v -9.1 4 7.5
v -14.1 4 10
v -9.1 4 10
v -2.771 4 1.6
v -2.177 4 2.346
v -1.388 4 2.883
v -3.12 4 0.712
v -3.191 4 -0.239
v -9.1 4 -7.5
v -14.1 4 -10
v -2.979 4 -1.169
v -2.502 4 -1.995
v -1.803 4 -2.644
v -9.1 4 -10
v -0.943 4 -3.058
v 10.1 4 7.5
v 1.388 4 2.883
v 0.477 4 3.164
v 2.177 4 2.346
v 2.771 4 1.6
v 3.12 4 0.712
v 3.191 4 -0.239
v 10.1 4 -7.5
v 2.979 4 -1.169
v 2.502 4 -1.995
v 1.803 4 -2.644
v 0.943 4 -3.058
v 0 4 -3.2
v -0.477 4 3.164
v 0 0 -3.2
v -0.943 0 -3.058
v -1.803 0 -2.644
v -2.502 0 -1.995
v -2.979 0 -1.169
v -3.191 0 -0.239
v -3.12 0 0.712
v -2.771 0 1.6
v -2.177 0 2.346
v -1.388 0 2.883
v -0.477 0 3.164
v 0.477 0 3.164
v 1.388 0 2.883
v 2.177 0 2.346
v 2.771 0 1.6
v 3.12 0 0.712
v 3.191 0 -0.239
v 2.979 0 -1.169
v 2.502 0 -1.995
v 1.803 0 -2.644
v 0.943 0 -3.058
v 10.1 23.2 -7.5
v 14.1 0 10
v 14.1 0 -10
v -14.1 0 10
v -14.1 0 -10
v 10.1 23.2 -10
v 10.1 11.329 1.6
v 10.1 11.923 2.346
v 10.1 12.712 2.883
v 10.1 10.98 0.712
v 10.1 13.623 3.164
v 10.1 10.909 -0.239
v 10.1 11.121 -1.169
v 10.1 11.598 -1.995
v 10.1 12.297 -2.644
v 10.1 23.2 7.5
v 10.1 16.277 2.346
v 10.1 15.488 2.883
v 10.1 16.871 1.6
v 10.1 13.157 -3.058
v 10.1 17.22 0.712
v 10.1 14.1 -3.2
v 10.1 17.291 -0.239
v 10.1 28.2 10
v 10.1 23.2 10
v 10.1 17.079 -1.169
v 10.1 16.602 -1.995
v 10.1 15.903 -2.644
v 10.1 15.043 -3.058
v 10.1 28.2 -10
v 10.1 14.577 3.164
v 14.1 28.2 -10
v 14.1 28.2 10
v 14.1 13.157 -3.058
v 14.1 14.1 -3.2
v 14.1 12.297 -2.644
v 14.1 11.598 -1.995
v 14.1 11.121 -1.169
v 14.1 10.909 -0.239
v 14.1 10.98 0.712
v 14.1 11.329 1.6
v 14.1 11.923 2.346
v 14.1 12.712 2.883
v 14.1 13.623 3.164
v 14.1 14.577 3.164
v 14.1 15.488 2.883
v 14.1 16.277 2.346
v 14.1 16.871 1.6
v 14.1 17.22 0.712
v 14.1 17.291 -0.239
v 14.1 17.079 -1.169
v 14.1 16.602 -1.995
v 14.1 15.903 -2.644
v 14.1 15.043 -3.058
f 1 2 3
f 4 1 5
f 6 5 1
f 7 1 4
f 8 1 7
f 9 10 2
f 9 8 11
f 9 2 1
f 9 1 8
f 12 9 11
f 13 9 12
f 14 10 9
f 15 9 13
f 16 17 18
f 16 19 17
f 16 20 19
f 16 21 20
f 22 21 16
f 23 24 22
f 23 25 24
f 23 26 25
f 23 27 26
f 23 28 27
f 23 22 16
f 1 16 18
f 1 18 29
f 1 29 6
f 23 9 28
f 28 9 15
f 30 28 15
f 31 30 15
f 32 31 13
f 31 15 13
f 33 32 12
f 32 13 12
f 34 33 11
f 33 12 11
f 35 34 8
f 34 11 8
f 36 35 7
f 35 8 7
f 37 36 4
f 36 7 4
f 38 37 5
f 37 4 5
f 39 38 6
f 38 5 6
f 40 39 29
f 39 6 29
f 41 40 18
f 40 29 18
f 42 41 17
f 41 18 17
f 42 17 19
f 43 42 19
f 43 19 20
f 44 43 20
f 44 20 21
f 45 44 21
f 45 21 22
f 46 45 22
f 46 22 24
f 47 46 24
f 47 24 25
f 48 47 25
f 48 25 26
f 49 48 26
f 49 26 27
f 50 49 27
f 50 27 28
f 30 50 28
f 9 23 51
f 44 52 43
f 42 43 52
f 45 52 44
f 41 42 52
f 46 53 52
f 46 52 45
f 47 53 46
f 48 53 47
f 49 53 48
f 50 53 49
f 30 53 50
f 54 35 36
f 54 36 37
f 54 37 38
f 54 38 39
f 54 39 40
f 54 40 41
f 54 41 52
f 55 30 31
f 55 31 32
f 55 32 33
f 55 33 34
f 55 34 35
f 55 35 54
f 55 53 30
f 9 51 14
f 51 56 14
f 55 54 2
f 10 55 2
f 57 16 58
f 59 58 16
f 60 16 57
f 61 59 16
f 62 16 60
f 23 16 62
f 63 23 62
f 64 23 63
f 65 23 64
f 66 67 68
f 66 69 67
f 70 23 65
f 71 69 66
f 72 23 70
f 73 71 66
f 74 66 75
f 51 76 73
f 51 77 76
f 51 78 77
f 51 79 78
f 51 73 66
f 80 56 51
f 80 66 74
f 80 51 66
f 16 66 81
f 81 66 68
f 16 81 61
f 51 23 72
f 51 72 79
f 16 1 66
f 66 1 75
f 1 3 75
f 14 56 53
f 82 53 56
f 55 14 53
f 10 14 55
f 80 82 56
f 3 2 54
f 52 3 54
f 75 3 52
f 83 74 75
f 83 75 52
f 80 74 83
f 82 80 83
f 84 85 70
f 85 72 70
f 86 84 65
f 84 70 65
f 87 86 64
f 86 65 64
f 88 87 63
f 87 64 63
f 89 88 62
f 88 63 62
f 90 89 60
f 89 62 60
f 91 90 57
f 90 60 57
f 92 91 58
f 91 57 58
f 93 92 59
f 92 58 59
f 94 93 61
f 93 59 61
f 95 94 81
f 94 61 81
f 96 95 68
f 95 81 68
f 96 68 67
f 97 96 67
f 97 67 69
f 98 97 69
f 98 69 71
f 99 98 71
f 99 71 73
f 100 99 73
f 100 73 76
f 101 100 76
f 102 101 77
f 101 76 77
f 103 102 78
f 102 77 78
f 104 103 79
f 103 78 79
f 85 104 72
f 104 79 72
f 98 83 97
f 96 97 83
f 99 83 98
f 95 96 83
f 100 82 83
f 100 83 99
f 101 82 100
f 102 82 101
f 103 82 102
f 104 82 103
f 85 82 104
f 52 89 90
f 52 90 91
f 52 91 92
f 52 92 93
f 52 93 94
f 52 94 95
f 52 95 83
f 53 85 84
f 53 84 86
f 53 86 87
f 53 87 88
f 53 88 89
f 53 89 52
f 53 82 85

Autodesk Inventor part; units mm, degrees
ref_plane "YZ Plane" through (0, 0, 0) normal (1, 0, 0) x (0, 1, 0)
ref_plane "XZ Plane" through (0, 0, 0) normal (0, 1, 0) x (-1, 0, 0)
ref_plane "XY Plane" through (0, 0, 0) normal (0, 0, 1) x (1, 0, 0)
sketch "Sketch1" plane through (0, 0, 0) normal (0, 0, 1) x (1, 0, 0)
  line L0 (14.1, 28.2) -> (14.1, 0)
  line L1 (14.1, 0) -> (-14.1, 0)
  line L2 (-14.1, 0) -> (-14.1, 4)
  line L3 (-14.1, 4) -> (10.1, 4)
  line L4 (10.1, 4) -> (10.1, 28.2)
  line L5 (10.1, 28.2) -> (14.1, 28.2)
  point P0 (0, 0)
  point P1 (0, 0)
  dimension "d0" = 28.2
  dimension "d1" = 4
extrude "Escuadra cuerpo" add sketch "Sketch1" along normal mid plane 20
sketch "Sketch2" plane through (0, 0, 10) normal (0, 0, 1) x (1, 0, 0)
  line L0 (10.1, 4) -> (-14.1, 4) projected
  line L1 (-9.1, 4) -> (10.1, 23.2)
  line L2 (10.1, 23.2) -> (10.1, 4)
  line L3 (10.1, 4) -> (-9.1, 4)
  line L4 (14.1, 28.2) -> (10.1, 28.2) projected
  point P0 (0, 0)
  dimension "d4" = 5
  dimension "d5" = 5
extrude "Nervia lateral 1" add sketch "Sketch2" against normal blind 2.5
sketch "Sketch3" plane through (0, 0, -10) normal (0, 0, -1) x (-1, 0, 0)
  line L0 (-10.1, 4) -> (-10.1, 23.2) projected
  line L1 (-10.1, 23.2) -> (9.1, 4)
  line L2 (14.1, 4) -> (-10.1, 4) projected
  line L3 (-10.1, 4) -> (-10.1, 28.2) projected
  line L4 (-10.1, 23.2) -> (-10.1, 4)
  line L5 (-10.1, 4) -> (9.1, 4)
  point P0 (0, 0)
  dimension "d8" = 5
  dimension "d9" = 5
extrude "Nervio lateral 2" add sketch "Sketch3" against normal blind 2.5
sketch "Sketch4" plane through (-14.1, 0, 10) normal (0, -1, 0) x (1, 0, 0)
  point P0 (14.1, -10)
  point P1 (14.1, -10)
hole "BCC M6 1" at (0, 0, 0) direction (0, 1, 0) diameter 6.4 end through all
sketch "Sketch5" plane through (14.1, 0, 10) normal (1, 0, 0) x (0, 0, -1)
  line L0 (0, 0) -> (0, 28.2) projected
  line L1 (20, 0) -> (0, 0) projected
  point P0 (10, 0)
  point P1 (10, 14.1)
  point P2 (0, 14.1)
  point P3 (10, 0)
hole "BCC M5 2" at (14.1, 14.1, 0) direction (-1, 0, 0) diameter 6.4 end through all
properties part number "Escuadra DC"
